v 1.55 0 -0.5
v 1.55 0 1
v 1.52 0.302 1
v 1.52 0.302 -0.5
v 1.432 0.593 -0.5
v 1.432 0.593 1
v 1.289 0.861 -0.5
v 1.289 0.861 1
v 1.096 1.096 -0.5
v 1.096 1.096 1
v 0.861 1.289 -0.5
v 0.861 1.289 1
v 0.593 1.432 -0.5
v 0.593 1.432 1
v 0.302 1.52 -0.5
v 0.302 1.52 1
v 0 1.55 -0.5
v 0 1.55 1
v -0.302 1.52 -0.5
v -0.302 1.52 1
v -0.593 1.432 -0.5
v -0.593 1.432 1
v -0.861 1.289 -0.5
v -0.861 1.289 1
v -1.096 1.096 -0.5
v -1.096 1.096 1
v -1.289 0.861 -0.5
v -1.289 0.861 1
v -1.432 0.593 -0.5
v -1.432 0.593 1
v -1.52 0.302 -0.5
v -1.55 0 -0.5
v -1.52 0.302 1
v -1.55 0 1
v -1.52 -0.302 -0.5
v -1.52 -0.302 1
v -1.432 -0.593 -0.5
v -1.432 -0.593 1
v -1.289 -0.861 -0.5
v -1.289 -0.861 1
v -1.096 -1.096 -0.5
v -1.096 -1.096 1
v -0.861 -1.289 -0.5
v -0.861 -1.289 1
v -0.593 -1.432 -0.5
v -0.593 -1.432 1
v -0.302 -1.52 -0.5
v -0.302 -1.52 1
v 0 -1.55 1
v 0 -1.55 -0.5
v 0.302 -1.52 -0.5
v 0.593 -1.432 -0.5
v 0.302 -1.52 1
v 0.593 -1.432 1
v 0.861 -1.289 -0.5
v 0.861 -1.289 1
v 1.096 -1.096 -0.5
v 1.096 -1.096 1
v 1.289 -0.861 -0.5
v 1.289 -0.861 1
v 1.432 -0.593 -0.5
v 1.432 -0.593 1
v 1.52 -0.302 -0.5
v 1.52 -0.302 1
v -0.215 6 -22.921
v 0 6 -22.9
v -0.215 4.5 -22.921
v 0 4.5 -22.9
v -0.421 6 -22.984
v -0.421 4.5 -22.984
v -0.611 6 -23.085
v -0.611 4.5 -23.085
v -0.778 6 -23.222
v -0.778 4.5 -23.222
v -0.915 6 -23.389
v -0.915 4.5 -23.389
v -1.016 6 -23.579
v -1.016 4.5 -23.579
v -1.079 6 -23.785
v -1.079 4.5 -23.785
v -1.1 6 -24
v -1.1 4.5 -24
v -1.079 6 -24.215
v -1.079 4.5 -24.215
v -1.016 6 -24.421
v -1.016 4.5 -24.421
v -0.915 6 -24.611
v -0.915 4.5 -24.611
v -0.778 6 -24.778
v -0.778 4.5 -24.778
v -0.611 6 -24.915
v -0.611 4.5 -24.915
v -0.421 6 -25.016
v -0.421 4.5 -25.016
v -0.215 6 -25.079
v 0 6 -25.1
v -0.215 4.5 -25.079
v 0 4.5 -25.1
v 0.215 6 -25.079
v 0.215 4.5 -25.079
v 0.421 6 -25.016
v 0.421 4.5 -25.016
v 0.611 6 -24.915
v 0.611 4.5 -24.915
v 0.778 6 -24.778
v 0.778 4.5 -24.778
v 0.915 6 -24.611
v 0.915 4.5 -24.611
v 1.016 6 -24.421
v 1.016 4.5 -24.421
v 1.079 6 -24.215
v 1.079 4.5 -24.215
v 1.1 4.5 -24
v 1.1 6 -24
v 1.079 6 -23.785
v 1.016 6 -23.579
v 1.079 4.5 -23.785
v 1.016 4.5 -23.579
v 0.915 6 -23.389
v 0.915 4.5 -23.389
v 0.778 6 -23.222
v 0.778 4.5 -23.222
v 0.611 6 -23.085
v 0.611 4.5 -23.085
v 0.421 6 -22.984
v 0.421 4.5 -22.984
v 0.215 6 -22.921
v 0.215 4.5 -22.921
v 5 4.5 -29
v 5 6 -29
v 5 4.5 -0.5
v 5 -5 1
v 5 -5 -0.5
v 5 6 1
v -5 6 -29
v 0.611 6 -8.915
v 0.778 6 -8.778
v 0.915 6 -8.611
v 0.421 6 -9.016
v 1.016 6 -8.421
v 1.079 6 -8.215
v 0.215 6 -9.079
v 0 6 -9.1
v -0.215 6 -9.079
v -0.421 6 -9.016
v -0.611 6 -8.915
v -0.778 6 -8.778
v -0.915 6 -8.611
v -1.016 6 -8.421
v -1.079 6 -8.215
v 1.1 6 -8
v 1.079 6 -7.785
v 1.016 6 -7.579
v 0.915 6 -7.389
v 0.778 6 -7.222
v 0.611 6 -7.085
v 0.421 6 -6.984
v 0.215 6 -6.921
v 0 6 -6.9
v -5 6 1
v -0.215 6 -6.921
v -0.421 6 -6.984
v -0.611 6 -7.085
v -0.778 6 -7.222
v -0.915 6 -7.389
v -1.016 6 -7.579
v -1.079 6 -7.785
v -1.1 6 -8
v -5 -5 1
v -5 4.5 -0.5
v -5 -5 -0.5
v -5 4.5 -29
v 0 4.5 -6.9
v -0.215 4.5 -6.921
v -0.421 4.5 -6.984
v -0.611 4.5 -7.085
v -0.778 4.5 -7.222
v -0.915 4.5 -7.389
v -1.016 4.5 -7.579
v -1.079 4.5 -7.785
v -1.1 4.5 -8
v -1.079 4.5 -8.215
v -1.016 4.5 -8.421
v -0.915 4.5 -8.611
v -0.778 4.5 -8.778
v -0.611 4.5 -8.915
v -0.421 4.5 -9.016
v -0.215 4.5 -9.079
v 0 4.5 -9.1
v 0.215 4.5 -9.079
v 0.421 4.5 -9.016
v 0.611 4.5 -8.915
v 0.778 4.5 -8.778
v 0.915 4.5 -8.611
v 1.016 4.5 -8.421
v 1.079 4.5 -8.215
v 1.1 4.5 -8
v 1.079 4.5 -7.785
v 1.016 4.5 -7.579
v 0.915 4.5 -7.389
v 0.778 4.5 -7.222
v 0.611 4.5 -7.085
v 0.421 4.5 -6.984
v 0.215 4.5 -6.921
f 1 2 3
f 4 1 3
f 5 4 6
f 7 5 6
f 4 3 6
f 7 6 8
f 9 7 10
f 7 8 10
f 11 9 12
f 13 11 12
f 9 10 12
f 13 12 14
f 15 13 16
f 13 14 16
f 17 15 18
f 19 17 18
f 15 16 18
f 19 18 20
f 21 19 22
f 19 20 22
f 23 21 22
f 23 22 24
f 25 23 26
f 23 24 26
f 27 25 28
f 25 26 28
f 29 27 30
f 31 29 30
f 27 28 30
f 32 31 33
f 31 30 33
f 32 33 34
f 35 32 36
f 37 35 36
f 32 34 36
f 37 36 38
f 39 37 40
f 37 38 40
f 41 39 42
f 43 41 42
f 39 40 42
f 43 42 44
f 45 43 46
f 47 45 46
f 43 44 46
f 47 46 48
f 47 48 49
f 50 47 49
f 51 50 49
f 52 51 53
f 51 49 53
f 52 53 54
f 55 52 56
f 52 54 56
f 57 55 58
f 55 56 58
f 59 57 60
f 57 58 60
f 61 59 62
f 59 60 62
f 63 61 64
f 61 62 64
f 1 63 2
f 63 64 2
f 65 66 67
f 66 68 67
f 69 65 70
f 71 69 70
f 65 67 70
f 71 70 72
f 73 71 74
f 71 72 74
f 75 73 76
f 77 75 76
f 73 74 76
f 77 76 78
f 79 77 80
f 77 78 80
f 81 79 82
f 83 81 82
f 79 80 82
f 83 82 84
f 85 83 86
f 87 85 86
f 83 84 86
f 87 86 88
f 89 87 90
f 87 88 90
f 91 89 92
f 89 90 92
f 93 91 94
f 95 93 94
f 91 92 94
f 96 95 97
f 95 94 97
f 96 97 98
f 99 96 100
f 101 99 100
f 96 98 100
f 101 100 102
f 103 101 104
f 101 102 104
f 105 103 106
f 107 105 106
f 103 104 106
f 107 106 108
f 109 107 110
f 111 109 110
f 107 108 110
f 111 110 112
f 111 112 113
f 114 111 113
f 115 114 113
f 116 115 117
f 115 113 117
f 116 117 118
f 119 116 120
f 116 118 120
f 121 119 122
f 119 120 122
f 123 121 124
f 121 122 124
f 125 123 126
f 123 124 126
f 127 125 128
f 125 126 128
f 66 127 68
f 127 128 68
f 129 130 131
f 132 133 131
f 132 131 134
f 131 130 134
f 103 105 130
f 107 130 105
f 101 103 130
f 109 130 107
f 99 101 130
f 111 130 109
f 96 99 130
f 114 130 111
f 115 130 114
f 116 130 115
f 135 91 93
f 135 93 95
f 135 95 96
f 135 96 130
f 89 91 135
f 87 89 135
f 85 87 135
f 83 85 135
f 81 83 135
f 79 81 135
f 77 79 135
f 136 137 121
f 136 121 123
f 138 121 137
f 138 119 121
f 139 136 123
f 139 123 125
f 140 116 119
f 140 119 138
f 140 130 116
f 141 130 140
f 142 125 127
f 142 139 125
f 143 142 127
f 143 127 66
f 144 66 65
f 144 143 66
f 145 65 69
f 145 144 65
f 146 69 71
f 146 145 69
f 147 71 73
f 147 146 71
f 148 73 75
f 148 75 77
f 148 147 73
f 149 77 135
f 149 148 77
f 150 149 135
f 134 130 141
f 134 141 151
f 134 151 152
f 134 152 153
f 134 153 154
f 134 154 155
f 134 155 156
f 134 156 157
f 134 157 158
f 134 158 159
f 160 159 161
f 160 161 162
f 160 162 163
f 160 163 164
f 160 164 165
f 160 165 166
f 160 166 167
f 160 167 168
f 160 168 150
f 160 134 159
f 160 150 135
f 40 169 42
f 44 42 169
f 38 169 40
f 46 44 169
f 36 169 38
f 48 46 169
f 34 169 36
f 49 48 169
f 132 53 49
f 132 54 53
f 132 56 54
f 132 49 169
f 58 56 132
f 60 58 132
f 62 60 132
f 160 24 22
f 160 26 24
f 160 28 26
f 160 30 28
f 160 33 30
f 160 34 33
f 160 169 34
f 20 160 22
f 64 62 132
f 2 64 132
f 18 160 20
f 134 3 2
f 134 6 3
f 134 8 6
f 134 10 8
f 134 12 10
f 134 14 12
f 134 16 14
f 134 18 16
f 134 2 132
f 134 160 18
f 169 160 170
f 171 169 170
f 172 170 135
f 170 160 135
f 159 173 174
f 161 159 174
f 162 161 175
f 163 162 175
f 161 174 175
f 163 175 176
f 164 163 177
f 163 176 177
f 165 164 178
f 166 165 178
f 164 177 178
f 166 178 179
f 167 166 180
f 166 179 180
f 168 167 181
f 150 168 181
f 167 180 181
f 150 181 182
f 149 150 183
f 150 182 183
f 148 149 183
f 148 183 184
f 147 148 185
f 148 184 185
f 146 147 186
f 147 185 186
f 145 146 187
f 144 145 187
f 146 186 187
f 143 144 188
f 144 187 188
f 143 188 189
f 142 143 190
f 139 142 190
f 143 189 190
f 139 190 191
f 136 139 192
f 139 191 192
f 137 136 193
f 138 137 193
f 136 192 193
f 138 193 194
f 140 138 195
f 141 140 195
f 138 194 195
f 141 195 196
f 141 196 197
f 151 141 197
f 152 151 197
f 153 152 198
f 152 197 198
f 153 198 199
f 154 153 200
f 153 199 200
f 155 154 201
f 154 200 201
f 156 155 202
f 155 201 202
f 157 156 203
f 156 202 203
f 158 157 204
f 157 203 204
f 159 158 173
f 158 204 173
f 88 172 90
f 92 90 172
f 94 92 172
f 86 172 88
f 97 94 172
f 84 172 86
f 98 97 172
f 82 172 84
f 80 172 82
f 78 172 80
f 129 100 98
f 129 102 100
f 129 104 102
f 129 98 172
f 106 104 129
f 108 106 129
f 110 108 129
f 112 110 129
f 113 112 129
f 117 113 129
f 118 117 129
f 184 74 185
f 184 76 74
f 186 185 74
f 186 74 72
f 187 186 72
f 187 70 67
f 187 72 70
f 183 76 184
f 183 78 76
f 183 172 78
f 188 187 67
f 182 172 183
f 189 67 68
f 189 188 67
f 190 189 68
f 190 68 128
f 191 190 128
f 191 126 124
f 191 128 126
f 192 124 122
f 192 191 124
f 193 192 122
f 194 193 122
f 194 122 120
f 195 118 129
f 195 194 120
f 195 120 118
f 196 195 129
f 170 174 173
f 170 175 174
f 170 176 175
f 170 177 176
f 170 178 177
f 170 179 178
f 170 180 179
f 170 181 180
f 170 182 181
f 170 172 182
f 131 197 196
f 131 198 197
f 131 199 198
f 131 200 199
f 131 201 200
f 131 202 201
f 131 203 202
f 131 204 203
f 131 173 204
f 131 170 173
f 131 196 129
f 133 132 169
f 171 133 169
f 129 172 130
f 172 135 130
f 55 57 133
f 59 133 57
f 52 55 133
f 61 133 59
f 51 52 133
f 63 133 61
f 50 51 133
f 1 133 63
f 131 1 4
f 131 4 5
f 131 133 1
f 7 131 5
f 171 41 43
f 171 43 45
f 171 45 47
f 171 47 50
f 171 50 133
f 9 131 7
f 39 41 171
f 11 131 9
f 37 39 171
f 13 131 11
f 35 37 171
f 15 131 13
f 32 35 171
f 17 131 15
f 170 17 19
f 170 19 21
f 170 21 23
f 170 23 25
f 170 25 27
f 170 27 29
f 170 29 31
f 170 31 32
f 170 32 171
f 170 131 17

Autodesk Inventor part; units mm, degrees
ref_plane "YZ Plane" through (0, 0, 0) normal (1, 0, 0) x (0, 1, 0)
ref_plane "XZ Plane" through (0, 0, 0) normal (0, 1, 0) x (-1, 0, 0)
ref_plane "XY Plane" through (0, 0, 0) normal (0, 0, 1) x (1, 0, 0)
sketch "スケッチ1" plane through (0, 0, 0) normal (0, 0, 1) x (1, 0, 0)
  line L0 (-5, 5) -> (5, 5)
  line L1 (5, 5) -> (5, -5)
  line L2 (5, -5) -> (-5, -5)
  line L3 (-5, -5) -> (-5, 5)
  line L4 (-5, 5) -> (5, -5) construction
  line L5 (5, 5) -> (-5, -5) construction
  point P0 (0, 0)
  dimension "d0" = 10
  dimension "d1" = 10
extrude "押し出し1" add sketch "スケッチ1" along normal blind 1
sketch "スケッチ4" plane through (0, 0, 1) normal (0, 0, 1) x (1, 0, 0)
  line L0 (-5, 5) -> (5, 5)
  line L1 (5, 5) -> (5, 6)
  line L2 (5, 6) -> (-5, 6)
  line L3 (-5, 6) -> (-5, 5)
  point P0 (0, 0)
  dimension "d11" = 1
extrude "押し出し2" add sketch "スケッチ4" against normal blind 30
sketch "スケッチ9" plane through (0, 0, 0) normal (0, 0, -1) x (-1, 0, 0)
  line L0 (-5, -5) -> (5, -5)
  line L1 (5, -5) -> (5, 5)
  line L2 (5, 5) -> (-5, 5)
  line L3 (-5, 5) -> (-5, -5)
  point P0 (0, 0)
extrude "押し出し6" add sketch "スケッチ9" along normal blind 0.5
sketch "スケッチ10" plane through (0, 0, 1) normal (0, 0, 1) x (1, 0, 0)
  circle A0 centre (0, 0) radius 1.55
  dimension "d37" = 3.1
extrude "押し出し7" cut sketch "スケッチ10" against normal blind 3
sketch "スケッチ11" plane through (-5, 5, -29) normal (0, -1, 0) x (1, 0, 0)
  line L0 (0, 0) -> (10, 0)
  line L1 (10, 0) -> (10, 28.5)
  line L2 (10, 28.5) -> (0, 28.5)
  line L3 (0, 28.5) -> (0, 0)
  point P0 (5, 29)
extrude "押し出し8" add sketch "スケッチ11" along normal blind 0.5
sketch "スケッチ12" plane through (-5, 6, 1) normal (0, 1, 0) x (1, 0, 0)
  line L0 (10, 0) -> (10, 30) projected
  point P0 (5, 1)
  point P1 (5, 25)
  point P2 (5, 9)
  dimension "d42" = 16
  dimension "d43" = 8
  dimension "d44" = 5
hole "穴3" at (0, 6, -24) at (0, 6, -8) direction (0, -1, 0) diameter 2.2 depth 8 tip angle 118
properties part number "Servo catch front" material "アルミニウム 1100-H14"
